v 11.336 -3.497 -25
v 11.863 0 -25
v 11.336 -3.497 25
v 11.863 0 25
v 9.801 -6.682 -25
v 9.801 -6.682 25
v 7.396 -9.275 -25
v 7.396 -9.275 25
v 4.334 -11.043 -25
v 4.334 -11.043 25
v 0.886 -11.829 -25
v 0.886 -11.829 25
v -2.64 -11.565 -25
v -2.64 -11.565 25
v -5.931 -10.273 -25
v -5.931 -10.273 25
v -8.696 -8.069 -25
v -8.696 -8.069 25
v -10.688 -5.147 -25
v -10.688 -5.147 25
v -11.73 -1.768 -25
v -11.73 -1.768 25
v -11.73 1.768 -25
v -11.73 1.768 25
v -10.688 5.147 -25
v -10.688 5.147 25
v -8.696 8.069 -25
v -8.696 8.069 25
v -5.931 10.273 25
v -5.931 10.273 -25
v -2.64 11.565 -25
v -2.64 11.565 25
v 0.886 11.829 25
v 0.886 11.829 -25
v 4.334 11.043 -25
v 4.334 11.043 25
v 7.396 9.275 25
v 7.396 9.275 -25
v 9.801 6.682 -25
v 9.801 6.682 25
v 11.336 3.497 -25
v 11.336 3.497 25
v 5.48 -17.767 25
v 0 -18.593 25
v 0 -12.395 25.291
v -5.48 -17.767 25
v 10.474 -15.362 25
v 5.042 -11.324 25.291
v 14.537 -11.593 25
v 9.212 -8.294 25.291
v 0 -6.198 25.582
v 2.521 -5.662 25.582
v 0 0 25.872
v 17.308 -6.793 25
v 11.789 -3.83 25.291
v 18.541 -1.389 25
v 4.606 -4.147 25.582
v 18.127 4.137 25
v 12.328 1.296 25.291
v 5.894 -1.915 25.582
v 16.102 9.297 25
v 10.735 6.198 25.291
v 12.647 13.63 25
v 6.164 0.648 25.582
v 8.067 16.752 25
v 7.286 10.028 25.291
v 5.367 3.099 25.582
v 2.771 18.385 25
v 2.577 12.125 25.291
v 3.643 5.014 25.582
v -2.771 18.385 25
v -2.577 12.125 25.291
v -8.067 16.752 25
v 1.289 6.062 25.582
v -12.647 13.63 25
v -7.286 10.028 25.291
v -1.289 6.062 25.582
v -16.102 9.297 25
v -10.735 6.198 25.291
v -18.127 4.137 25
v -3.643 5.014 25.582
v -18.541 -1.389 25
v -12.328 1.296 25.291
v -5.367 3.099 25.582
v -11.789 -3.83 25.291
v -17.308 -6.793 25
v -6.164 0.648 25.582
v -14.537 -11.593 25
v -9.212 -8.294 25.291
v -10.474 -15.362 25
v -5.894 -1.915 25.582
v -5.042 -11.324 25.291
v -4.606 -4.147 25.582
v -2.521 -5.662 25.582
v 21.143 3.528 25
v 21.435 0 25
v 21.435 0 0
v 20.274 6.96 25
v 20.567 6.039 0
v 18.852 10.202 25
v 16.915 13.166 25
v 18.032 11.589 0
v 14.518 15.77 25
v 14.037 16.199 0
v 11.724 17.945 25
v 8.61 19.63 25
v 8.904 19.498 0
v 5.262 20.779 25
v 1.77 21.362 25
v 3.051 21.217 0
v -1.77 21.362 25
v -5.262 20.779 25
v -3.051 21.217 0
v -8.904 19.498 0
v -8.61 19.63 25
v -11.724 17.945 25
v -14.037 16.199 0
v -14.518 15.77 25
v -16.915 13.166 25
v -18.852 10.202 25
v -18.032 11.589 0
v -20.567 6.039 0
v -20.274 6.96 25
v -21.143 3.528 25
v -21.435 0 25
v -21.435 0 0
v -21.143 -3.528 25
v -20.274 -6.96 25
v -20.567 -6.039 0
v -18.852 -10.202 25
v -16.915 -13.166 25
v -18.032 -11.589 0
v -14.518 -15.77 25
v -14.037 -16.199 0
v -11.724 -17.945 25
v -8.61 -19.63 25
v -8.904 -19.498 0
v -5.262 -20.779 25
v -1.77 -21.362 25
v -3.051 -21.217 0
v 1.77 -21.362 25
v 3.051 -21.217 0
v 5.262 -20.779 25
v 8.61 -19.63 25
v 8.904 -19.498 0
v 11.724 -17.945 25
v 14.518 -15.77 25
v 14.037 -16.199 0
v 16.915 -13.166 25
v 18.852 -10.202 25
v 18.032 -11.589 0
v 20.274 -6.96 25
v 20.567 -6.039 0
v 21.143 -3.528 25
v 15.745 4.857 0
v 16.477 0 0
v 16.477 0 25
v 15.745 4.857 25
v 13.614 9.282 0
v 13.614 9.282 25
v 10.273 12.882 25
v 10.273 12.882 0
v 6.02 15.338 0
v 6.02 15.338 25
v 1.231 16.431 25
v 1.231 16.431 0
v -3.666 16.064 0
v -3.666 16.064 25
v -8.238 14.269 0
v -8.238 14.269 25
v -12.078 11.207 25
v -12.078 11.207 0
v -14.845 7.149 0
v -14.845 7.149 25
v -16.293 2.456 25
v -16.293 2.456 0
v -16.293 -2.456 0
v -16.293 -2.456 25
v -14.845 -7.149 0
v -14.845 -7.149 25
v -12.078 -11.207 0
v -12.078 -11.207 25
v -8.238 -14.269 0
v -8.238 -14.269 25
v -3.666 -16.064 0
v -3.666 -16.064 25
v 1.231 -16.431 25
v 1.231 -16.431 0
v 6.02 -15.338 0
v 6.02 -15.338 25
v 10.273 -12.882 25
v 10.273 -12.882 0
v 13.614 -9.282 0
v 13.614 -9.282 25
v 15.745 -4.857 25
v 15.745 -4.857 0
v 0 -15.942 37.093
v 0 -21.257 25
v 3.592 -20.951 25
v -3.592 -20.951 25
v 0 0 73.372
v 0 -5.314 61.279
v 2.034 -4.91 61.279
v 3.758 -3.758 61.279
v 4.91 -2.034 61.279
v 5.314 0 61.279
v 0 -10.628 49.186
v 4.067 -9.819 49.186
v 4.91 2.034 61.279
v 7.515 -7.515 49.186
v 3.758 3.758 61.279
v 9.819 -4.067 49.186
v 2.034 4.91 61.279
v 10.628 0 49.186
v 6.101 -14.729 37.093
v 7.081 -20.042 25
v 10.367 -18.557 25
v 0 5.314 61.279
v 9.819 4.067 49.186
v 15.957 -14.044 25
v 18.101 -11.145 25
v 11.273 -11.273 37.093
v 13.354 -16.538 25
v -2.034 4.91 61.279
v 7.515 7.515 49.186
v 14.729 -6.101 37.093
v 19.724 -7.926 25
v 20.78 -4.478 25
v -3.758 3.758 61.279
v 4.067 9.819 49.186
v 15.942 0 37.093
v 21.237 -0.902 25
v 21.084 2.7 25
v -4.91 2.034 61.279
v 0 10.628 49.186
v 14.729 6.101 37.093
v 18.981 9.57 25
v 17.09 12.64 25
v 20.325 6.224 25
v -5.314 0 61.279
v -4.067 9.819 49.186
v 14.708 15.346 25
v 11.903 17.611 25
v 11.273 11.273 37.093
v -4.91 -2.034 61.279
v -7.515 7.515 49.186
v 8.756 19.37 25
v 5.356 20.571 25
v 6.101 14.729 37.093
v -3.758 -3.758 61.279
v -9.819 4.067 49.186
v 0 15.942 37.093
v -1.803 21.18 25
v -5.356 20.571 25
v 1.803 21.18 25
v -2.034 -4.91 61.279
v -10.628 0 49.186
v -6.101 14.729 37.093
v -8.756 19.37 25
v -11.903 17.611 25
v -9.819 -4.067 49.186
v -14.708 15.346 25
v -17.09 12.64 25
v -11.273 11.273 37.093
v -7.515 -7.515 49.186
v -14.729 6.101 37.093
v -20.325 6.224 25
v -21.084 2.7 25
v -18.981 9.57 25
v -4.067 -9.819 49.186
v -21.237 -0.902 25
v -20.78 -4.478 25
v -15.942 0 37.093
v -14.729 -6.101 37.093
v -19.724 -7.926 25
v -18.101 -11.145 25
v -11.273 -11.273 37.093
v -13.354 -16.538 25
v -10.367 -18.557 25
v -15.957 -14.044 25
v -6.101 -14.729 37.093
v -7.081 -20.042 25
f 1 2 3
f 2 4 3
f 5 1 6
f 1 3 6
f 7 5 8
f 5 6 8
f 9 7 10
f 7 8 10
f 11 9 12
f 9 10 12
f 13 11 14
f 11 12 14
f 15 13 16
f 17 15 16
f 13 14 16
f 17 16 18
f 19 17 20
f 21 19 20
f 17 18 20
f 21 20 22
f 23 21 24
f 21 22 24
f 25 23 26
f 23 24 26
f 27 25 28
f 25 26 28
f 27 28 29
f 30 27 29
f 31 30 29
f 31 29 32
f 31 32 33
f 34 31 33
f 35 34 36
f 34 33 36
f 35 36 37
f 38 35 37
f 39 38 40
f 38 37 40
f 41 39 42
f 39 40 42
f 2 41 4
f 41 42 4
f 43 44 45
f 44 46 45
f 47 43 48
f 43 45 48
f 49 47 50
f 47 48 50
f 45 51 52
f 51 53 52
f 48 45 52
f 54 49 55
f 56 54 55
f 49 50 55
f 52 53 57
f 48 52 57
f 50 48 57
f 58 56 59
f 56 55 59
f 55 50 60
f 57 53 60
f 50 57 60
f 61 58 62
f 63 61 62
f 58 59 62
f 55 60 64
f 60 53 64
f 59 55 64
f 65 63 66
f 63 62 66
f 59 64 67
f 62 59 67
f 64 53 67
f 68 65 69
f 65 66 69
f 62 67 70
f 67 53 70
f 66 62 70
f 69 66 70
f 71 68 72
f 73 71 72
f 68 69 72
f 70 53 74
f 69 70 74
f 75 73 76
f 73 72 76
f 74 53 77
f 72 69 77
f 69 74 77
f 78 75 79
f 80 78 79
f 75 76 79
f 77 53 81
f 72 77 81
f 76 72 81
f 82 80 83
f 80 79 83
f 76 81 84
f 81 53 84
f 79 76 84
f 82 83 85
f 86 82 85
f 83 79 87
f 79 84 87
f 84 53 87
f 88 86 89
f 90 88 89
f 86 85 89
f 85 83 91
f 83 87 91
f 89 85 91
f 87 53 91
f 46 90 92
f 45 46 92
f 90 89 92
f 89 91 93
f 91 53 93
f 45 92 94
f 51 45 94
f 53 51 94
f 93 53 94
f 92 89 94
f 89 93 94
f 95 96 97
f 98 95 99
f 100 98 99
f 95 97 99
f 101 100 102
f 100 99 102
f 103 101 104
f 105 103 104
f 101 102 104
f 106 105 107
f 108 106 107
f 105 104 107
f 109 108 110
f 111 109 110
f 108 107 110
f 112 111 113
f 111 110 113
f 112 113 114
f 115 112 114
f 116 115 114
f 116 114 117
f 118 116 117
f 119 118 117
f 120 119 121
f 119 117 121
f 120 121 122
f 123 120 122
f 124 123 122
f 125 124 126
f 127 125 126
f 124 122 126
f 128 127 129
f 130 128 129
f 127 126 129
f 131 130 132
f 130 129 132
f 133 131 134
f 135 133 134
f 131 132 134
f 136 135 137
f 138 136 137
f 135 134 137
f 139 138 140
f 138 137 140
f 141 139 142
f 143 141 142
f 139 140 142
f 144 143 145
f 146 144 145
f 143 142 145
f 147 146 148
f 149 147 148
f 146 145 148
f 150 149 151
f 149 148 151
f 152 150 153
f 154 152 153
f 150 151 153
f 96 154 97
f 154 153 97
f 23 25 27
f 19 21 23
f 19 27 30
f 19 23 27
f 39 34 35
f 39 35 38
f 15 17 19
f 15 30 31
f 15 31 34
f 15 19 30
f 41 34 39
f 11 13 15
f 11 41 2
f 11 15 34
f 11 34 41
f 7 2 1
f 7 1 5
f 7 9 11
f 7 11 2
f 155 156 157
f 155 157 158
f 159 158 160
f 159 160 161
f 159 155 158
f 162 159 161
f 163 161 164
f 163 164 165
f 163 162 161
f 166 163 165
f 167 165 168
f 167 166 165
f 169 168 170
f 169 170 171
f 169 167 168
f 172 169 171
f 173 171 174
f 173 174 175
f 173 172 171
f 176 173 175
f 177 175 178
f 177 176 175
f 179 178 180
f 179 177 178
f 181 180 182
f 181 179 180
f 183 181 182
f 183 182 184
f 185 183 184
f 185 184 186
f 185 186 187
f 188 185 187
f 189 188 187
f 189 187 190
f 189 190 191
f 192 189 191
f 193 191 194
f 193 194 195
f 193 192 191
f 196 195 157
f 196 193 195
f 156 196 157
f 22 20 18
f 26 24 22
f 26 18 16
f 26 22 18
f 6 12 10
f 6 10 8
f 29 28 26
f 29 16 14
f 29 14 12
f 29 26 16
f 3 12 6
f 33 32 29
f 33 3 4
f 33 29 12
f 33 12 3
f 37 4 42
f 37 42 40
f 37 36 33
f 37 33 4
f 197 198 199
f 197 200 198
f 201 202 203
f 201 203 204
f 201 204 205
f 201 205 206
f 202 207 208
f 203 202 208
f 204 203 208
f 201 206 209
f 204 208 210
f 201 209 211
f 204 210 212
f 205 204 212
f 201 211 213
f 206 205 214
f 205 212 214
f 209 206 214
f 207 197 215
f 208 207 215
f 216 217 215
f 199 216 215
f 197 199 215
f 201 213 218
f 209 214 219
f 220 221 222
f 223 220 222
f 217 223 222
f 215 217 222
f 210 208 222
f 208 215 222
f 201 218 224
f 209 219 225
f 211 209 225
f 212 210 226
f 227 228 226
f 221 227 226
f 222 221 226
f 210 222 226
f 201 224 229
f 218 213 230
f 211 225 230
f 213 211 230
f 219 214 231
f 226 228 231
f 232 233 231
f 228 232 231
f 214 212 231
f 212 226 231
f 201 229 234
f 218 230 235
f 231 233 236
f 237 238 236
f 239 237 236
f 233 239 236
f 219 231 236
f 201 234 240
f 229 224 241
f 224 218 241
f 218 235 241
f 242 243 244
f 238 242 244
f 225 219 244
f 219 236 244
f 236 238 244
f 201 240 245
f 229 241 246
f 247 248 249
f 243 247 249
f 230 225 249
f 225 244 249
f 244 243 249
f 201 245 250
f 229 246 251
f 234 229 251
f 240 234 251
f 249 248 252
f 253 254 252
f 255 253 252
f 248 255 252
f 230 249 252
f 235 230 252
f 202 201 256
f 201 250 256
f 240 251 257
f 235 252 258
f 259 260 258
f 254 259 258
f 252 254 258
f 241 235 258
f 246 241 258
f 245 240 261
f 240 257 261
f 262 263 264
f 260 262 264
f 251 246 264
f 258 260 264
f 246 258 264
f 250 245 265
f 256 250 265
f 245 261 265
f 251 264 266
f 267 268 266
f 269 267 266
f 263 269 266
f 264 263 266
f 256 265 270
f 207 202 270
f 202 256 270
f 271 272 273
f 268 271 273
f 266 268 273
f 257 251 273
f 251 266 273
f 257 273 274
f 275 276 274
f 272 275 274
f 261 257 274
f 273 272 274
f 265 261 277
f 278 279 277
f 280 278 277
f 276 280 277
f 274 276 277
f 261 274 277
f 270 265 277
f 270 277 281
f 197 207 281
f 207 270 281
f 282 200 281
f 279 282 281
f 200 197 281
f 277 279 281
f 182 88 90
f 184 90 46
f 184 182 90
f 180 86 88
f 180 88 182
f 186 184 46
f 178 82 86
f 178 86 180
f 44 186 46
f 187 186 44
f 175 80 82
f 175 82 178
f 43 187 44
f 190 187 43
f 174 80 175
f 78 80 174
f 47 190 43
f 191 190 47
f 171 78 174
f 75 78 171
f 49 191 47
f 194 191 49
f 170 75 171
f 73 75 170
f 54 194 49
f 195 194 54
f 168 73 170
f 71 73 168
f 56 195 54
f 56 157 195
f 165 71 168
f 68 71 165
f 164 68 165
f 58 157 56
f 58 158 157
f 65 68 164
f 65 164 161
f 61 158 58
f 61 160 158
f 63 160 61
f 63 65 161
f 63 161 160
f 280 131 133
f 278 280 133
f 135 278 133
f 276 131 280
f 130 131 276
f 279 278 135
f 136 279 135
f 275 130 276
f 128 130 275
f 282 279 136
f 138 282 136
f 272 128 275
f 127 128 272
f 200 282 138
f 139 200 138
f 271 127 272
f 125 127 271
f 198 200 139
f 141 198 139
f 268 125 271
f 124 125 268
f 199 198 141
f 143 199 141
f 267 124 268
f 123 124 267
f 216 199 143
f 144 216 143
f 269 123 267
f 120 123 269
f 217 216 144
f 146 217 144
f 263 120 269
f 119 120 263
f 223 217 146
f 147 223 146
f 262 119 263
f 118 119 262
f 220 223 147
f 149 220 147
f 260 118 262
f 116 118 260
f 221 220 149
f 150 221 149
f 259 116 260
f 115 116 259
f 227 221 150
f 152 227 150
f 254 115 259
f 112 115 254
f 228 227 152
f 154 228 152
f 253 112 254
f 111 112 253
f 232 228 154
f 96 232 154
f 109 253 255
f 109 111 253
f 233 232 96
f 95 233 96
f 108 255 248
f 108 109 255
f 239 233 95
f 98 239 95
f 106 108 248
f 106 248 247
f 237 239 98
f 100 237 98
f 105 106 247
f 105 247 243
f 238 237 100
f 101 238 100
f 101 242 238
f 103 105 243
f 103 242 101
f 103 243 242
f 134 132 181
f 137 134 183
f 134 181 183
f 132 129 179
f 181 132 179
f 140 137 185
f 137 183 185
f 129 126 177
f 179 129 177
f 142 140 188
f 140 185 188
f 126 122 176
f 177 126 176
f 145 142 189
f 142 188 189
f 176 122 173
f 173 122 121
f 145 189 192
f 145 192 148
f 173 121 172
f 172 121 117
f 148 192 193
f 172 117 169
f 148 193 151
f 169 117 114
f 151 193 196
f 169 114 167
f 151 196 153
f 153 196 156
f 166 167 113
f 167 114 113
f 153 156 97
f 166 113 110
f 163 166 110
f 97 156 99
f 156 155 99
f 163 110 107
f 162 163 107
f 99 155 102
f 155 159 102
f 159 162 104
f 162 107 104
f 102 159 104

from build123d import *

# Parameters (mm, degrees)
F0_R      = 21.435
F0_R_2    = 19.35
F1_DEPTH  = 25
F4_R      = 19.35
F4_R_2    = 16.476684
F5_DEPTH  = 25
F6_R      = 11.862632
F7_DEPTH  = 25
F7_FACE_R = 11.862632
F8_DEPTH  = 25


with BuildPart() as f1:
    # F0 (on Top) → F1 (new body)
    with BuildSketch(Plane.XY):
        Circle(F0_R)
        Circle(F0_R_2, mode=Mode.SUBTRACT)
    extrude(amount=F1_DEPTH)

    # F2 (on Right) → F3 (revolve)
    with BuildSketch(Plane.YZ):
        Polygon((0, 73.372401), (-21.312717, 24.872396), (0, 25.872396), align=None)
    revolve(axis=Axis((0, 0, 6.186198), (0, 0, 1)))

    # F4 (on Top) → F5 (join)
    with BuildSketch(Plane.XY):
        Circle(F4_R)
        Circle(F4_R_2, mode=Mode.SUBTRACT)
    extrude(amount=F5_DEPTH)


with BuildPart() as f7:
    # F6 (on Top) → F7 (new body)
    with BuildSketch(Plane.XY):
        Circle(F6_R)
    extrude(amount=F7_DEPTH)

    # F7_face (on face) → F8 (join)
    with BuildSketch(Plane(origin=(0, 0, 0), x_dir=(1, 0, 0), z_dir=(0, 0, -1))):
        Circle(F7_FACE_R)
    extrude(amount=F8_DEPTH)


solid = Compound([f1.part, f7.part])
